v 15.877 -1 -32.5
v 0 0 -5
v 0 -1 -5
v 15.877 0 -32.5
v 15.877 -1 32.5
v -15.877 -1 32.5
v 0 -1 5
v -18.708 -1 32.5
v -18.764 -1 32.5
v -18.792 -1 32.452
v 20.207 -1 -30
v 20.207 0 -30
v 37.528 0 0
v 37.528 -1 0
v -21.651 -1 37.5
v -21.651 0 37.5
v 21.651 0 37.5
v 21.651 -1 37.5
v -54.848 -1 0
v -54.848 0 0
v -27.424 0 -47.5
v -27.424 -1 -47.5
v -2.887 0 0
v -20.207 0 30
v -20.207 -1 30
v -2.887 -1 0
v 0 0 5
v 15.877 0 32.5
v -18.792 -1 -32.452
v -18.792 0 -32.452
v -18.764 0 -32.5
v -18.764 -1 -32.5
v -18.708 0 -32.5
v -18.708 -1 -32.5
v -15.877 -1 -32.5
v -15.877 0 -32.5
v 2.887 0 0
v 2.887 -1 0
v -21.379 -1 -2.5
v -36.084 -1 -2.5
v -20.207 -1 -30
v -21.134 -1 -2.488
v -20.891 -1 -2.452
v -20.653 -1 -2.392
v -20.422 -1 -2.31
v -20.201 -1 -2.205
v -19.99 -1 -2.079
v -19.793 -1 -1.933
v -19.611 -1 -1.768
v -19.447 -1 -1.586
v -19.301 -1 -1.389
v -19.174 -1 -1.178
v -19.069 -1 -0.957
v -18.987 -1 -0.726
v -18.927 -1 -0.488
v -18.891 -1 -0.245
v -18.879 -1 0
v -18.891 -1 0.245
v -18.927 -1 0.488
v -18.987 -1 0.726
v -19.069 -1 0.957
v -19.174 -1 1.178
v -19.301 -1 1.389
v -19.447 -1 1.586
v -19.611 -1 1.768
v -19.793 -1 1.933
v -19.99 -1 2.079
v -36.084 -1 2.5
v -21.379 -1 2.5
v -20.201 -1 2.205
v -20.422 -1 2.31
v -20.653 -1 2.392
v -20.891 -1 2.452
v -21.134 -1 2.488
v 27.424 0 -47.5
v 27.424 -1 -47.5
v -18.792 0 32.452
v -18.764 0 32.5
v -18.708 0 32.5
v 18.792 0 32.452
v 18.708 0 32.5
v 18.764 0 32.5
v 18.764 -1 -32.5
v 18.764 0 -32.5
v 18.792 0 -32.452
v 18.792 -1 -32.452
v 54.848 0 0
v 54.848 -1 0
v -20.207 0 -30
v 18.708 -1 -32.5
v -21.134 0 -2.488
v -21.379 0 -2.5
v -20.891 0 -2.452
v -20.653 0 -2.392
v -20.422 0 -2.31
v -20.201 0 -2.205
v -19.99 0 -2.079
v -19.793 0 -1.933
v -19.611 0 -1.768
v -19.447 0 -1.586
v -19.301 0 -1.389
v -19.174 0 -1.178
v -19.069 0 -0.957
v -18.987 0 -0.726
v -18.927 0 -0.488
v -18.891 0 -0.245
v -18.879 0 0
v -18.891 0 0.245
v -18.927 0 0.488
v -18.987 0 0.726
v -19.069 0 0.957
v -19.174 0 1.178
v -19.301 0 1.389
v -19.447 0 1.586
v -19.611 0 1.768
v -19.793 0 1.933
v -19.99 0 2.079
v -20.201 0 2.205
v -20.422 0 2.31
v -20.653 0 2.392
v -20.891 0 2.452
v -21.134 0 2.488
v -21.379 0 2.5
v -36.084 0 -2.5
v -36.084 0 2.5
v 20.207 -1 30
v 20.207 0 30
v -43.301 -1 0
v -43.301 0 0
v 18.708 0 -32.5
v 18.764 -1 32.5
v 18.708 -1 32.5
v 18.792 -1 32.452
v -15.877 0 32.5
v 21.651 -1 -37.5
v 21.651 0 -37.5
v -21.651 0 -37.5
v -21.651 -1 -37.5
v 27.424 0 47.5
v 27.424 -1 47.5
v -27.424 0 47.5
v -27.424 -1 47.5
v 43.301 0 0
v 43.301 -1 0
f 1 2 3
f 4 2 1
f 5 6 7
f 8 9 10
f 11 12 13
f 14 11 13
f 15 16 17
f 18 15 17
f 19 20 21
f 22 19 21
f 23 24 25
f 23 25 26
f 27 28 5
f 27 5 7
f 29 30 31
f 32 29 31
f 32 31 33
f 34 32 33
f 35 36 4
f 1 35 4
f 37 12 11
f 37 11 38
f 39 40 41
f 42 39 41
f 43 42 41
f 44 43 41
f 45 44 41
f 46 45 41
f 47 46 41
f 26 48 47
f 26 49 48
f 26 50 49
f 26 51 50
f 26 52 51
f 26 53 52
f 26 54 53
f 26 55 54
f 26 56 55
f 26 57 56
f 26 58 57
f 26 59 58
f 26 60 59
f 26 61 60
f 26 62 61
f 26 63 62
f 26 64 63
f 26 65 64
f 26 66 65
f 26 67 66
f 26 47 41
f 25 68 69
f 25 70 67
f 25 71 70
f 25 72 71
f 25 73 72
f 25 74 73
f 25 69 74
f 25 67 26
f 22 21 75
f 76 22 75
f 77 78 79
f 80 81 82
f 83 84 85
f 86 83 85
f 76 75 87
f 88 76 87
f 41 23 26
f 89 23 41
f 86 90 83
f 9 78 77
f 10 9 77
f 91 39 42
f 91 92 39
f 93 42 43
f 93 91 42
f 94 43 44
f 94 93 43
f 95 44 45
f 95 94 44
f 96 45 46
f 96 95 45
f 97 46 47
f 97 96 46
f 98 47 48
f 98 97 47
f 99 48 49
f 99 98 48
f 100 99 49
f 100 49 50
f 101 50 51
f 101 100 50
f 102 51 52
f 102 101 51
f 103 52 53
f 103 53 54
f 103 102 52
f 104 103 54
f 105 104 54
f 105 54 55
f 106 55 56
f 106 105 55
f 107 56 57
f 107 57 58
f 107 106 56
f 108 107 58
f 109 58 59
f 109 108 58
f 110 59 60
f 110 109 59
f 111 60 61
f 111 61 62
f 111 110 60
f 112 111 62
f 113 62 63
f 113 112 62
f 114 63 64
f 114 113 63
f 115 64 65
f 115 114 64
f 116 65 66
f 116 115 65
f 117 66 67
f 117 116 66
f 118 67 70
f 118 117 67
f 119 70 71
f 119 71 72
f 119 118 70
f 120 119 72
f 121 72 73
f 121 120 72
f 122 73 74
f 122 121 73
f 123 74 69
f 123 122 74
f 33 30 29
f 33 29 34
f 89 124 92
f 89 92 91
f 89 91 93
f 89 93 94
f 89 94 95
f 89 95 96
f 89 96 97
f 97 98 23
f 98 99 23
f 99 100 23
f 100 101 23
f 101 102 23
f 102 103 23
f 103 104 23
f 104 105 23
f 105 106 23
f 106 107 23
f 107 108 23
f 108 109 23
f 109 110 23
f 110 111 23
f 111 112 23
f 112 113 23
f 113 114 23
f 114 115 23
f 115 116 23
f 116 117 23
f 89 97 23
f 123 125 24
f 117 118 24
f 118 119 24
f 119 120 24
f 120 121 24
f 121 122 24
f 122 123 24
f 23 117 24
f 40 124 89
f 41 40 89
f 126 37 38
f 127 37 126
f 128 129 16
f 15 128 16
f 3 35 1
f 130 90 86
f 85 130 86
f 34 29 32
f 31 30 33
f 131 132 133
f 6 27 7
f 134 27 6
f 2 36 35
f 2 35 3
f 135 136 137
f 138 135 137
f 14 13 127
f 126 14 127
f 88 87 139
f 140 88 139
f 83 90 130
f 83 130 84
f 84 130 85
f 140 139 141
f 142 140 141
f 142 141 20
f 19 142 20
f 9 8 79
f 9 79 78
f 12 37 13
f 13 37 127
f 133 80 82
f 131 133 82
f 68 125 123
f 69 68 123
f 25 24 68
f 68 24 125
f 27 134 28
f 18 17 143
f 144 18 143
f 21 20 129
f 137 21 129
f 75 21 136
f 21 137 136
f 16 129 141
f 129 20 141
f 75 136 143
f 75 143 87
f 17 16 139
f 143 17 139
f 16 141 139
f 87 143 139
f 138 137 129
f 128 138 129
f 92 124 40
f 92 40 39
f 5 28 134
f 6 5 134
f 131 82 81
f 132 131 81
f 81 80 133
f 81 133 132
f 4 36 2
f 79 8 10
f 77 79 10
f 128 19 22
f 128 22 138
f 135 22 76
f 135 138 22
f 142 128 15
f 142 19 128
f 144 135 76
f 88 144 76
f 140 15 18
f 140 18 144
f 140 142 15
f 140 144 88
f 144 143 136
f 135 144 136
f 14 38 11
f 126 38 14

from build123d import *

# Parameters (mm, degrees)
F6_DEPTH = 1
F7_DEPTH = 1
F4_W     = 20
F4_H     = 5
F5_R     = 2.5
F8_DEPTH = 1


with BuildPart() as f6:
    # F0 (on Front) → F6 (new body)
    with BuildSketch(Plane.XZ):
        Polygon((-27.424138, -47.5), (27.424138, -47.5), (54.848276, 0), (27.424138, 47.5), (-27.424138, 47.5), (-54.848276, 0), align=None)
        Polygon((21.650635, 37.5), (43.30127, 0), (21.650635, -37.5), (-21.650635, -37.5), (-43.30127, 0), (-21.650635, 37.5), align=None, mode=Mode.SUBTRACT)
    extrude(amount=F6_DEPTH)


with BuildPart() as f7:
    # F3 (on Front) → F7 (new body)
    with BuildSketch(Plane.XZ):
        Polygon((-18.763884, -32.5), (18.763884, -32.5), (37.527767, 0), (18.763884, 32.5), (-18.763884, 32.5), (-37.527767, 0), align=None)
    extrude(amount=F7_DEPTH)

    # F1 (on Front) + F2 (on Front) + F4 (on Front) + F5 (on Front) → F8 (cut)
    with BuildSketch(Plane.XZ):
        Polygon((16.584936, 33.725953), (-20.915064, -31.225953), (-16.584936, -33.725953), (20.915064, 31.225953), align=None)
    with BuildSketch(Plane.XZ):
        Polygon((20.915064, -31.225953), (-16.584936, 33.725953), (-20.915064, 31.225953), (16.584936, -33.725953), align=None)
    with BuildSketch(Plane.XZ):
        with Locations((-31.379187, 0)):
            Rectangle(F4_W, F4_H)
    with BuildSketch(Plane.XZ):
        with Locations((-21.379187, 0)):
            Circle(F5_R)
    extrude(amount=F8_DEPTH, mode=Mode.SUBTRACT)


solid = Compound([f6.part, f7.part])
